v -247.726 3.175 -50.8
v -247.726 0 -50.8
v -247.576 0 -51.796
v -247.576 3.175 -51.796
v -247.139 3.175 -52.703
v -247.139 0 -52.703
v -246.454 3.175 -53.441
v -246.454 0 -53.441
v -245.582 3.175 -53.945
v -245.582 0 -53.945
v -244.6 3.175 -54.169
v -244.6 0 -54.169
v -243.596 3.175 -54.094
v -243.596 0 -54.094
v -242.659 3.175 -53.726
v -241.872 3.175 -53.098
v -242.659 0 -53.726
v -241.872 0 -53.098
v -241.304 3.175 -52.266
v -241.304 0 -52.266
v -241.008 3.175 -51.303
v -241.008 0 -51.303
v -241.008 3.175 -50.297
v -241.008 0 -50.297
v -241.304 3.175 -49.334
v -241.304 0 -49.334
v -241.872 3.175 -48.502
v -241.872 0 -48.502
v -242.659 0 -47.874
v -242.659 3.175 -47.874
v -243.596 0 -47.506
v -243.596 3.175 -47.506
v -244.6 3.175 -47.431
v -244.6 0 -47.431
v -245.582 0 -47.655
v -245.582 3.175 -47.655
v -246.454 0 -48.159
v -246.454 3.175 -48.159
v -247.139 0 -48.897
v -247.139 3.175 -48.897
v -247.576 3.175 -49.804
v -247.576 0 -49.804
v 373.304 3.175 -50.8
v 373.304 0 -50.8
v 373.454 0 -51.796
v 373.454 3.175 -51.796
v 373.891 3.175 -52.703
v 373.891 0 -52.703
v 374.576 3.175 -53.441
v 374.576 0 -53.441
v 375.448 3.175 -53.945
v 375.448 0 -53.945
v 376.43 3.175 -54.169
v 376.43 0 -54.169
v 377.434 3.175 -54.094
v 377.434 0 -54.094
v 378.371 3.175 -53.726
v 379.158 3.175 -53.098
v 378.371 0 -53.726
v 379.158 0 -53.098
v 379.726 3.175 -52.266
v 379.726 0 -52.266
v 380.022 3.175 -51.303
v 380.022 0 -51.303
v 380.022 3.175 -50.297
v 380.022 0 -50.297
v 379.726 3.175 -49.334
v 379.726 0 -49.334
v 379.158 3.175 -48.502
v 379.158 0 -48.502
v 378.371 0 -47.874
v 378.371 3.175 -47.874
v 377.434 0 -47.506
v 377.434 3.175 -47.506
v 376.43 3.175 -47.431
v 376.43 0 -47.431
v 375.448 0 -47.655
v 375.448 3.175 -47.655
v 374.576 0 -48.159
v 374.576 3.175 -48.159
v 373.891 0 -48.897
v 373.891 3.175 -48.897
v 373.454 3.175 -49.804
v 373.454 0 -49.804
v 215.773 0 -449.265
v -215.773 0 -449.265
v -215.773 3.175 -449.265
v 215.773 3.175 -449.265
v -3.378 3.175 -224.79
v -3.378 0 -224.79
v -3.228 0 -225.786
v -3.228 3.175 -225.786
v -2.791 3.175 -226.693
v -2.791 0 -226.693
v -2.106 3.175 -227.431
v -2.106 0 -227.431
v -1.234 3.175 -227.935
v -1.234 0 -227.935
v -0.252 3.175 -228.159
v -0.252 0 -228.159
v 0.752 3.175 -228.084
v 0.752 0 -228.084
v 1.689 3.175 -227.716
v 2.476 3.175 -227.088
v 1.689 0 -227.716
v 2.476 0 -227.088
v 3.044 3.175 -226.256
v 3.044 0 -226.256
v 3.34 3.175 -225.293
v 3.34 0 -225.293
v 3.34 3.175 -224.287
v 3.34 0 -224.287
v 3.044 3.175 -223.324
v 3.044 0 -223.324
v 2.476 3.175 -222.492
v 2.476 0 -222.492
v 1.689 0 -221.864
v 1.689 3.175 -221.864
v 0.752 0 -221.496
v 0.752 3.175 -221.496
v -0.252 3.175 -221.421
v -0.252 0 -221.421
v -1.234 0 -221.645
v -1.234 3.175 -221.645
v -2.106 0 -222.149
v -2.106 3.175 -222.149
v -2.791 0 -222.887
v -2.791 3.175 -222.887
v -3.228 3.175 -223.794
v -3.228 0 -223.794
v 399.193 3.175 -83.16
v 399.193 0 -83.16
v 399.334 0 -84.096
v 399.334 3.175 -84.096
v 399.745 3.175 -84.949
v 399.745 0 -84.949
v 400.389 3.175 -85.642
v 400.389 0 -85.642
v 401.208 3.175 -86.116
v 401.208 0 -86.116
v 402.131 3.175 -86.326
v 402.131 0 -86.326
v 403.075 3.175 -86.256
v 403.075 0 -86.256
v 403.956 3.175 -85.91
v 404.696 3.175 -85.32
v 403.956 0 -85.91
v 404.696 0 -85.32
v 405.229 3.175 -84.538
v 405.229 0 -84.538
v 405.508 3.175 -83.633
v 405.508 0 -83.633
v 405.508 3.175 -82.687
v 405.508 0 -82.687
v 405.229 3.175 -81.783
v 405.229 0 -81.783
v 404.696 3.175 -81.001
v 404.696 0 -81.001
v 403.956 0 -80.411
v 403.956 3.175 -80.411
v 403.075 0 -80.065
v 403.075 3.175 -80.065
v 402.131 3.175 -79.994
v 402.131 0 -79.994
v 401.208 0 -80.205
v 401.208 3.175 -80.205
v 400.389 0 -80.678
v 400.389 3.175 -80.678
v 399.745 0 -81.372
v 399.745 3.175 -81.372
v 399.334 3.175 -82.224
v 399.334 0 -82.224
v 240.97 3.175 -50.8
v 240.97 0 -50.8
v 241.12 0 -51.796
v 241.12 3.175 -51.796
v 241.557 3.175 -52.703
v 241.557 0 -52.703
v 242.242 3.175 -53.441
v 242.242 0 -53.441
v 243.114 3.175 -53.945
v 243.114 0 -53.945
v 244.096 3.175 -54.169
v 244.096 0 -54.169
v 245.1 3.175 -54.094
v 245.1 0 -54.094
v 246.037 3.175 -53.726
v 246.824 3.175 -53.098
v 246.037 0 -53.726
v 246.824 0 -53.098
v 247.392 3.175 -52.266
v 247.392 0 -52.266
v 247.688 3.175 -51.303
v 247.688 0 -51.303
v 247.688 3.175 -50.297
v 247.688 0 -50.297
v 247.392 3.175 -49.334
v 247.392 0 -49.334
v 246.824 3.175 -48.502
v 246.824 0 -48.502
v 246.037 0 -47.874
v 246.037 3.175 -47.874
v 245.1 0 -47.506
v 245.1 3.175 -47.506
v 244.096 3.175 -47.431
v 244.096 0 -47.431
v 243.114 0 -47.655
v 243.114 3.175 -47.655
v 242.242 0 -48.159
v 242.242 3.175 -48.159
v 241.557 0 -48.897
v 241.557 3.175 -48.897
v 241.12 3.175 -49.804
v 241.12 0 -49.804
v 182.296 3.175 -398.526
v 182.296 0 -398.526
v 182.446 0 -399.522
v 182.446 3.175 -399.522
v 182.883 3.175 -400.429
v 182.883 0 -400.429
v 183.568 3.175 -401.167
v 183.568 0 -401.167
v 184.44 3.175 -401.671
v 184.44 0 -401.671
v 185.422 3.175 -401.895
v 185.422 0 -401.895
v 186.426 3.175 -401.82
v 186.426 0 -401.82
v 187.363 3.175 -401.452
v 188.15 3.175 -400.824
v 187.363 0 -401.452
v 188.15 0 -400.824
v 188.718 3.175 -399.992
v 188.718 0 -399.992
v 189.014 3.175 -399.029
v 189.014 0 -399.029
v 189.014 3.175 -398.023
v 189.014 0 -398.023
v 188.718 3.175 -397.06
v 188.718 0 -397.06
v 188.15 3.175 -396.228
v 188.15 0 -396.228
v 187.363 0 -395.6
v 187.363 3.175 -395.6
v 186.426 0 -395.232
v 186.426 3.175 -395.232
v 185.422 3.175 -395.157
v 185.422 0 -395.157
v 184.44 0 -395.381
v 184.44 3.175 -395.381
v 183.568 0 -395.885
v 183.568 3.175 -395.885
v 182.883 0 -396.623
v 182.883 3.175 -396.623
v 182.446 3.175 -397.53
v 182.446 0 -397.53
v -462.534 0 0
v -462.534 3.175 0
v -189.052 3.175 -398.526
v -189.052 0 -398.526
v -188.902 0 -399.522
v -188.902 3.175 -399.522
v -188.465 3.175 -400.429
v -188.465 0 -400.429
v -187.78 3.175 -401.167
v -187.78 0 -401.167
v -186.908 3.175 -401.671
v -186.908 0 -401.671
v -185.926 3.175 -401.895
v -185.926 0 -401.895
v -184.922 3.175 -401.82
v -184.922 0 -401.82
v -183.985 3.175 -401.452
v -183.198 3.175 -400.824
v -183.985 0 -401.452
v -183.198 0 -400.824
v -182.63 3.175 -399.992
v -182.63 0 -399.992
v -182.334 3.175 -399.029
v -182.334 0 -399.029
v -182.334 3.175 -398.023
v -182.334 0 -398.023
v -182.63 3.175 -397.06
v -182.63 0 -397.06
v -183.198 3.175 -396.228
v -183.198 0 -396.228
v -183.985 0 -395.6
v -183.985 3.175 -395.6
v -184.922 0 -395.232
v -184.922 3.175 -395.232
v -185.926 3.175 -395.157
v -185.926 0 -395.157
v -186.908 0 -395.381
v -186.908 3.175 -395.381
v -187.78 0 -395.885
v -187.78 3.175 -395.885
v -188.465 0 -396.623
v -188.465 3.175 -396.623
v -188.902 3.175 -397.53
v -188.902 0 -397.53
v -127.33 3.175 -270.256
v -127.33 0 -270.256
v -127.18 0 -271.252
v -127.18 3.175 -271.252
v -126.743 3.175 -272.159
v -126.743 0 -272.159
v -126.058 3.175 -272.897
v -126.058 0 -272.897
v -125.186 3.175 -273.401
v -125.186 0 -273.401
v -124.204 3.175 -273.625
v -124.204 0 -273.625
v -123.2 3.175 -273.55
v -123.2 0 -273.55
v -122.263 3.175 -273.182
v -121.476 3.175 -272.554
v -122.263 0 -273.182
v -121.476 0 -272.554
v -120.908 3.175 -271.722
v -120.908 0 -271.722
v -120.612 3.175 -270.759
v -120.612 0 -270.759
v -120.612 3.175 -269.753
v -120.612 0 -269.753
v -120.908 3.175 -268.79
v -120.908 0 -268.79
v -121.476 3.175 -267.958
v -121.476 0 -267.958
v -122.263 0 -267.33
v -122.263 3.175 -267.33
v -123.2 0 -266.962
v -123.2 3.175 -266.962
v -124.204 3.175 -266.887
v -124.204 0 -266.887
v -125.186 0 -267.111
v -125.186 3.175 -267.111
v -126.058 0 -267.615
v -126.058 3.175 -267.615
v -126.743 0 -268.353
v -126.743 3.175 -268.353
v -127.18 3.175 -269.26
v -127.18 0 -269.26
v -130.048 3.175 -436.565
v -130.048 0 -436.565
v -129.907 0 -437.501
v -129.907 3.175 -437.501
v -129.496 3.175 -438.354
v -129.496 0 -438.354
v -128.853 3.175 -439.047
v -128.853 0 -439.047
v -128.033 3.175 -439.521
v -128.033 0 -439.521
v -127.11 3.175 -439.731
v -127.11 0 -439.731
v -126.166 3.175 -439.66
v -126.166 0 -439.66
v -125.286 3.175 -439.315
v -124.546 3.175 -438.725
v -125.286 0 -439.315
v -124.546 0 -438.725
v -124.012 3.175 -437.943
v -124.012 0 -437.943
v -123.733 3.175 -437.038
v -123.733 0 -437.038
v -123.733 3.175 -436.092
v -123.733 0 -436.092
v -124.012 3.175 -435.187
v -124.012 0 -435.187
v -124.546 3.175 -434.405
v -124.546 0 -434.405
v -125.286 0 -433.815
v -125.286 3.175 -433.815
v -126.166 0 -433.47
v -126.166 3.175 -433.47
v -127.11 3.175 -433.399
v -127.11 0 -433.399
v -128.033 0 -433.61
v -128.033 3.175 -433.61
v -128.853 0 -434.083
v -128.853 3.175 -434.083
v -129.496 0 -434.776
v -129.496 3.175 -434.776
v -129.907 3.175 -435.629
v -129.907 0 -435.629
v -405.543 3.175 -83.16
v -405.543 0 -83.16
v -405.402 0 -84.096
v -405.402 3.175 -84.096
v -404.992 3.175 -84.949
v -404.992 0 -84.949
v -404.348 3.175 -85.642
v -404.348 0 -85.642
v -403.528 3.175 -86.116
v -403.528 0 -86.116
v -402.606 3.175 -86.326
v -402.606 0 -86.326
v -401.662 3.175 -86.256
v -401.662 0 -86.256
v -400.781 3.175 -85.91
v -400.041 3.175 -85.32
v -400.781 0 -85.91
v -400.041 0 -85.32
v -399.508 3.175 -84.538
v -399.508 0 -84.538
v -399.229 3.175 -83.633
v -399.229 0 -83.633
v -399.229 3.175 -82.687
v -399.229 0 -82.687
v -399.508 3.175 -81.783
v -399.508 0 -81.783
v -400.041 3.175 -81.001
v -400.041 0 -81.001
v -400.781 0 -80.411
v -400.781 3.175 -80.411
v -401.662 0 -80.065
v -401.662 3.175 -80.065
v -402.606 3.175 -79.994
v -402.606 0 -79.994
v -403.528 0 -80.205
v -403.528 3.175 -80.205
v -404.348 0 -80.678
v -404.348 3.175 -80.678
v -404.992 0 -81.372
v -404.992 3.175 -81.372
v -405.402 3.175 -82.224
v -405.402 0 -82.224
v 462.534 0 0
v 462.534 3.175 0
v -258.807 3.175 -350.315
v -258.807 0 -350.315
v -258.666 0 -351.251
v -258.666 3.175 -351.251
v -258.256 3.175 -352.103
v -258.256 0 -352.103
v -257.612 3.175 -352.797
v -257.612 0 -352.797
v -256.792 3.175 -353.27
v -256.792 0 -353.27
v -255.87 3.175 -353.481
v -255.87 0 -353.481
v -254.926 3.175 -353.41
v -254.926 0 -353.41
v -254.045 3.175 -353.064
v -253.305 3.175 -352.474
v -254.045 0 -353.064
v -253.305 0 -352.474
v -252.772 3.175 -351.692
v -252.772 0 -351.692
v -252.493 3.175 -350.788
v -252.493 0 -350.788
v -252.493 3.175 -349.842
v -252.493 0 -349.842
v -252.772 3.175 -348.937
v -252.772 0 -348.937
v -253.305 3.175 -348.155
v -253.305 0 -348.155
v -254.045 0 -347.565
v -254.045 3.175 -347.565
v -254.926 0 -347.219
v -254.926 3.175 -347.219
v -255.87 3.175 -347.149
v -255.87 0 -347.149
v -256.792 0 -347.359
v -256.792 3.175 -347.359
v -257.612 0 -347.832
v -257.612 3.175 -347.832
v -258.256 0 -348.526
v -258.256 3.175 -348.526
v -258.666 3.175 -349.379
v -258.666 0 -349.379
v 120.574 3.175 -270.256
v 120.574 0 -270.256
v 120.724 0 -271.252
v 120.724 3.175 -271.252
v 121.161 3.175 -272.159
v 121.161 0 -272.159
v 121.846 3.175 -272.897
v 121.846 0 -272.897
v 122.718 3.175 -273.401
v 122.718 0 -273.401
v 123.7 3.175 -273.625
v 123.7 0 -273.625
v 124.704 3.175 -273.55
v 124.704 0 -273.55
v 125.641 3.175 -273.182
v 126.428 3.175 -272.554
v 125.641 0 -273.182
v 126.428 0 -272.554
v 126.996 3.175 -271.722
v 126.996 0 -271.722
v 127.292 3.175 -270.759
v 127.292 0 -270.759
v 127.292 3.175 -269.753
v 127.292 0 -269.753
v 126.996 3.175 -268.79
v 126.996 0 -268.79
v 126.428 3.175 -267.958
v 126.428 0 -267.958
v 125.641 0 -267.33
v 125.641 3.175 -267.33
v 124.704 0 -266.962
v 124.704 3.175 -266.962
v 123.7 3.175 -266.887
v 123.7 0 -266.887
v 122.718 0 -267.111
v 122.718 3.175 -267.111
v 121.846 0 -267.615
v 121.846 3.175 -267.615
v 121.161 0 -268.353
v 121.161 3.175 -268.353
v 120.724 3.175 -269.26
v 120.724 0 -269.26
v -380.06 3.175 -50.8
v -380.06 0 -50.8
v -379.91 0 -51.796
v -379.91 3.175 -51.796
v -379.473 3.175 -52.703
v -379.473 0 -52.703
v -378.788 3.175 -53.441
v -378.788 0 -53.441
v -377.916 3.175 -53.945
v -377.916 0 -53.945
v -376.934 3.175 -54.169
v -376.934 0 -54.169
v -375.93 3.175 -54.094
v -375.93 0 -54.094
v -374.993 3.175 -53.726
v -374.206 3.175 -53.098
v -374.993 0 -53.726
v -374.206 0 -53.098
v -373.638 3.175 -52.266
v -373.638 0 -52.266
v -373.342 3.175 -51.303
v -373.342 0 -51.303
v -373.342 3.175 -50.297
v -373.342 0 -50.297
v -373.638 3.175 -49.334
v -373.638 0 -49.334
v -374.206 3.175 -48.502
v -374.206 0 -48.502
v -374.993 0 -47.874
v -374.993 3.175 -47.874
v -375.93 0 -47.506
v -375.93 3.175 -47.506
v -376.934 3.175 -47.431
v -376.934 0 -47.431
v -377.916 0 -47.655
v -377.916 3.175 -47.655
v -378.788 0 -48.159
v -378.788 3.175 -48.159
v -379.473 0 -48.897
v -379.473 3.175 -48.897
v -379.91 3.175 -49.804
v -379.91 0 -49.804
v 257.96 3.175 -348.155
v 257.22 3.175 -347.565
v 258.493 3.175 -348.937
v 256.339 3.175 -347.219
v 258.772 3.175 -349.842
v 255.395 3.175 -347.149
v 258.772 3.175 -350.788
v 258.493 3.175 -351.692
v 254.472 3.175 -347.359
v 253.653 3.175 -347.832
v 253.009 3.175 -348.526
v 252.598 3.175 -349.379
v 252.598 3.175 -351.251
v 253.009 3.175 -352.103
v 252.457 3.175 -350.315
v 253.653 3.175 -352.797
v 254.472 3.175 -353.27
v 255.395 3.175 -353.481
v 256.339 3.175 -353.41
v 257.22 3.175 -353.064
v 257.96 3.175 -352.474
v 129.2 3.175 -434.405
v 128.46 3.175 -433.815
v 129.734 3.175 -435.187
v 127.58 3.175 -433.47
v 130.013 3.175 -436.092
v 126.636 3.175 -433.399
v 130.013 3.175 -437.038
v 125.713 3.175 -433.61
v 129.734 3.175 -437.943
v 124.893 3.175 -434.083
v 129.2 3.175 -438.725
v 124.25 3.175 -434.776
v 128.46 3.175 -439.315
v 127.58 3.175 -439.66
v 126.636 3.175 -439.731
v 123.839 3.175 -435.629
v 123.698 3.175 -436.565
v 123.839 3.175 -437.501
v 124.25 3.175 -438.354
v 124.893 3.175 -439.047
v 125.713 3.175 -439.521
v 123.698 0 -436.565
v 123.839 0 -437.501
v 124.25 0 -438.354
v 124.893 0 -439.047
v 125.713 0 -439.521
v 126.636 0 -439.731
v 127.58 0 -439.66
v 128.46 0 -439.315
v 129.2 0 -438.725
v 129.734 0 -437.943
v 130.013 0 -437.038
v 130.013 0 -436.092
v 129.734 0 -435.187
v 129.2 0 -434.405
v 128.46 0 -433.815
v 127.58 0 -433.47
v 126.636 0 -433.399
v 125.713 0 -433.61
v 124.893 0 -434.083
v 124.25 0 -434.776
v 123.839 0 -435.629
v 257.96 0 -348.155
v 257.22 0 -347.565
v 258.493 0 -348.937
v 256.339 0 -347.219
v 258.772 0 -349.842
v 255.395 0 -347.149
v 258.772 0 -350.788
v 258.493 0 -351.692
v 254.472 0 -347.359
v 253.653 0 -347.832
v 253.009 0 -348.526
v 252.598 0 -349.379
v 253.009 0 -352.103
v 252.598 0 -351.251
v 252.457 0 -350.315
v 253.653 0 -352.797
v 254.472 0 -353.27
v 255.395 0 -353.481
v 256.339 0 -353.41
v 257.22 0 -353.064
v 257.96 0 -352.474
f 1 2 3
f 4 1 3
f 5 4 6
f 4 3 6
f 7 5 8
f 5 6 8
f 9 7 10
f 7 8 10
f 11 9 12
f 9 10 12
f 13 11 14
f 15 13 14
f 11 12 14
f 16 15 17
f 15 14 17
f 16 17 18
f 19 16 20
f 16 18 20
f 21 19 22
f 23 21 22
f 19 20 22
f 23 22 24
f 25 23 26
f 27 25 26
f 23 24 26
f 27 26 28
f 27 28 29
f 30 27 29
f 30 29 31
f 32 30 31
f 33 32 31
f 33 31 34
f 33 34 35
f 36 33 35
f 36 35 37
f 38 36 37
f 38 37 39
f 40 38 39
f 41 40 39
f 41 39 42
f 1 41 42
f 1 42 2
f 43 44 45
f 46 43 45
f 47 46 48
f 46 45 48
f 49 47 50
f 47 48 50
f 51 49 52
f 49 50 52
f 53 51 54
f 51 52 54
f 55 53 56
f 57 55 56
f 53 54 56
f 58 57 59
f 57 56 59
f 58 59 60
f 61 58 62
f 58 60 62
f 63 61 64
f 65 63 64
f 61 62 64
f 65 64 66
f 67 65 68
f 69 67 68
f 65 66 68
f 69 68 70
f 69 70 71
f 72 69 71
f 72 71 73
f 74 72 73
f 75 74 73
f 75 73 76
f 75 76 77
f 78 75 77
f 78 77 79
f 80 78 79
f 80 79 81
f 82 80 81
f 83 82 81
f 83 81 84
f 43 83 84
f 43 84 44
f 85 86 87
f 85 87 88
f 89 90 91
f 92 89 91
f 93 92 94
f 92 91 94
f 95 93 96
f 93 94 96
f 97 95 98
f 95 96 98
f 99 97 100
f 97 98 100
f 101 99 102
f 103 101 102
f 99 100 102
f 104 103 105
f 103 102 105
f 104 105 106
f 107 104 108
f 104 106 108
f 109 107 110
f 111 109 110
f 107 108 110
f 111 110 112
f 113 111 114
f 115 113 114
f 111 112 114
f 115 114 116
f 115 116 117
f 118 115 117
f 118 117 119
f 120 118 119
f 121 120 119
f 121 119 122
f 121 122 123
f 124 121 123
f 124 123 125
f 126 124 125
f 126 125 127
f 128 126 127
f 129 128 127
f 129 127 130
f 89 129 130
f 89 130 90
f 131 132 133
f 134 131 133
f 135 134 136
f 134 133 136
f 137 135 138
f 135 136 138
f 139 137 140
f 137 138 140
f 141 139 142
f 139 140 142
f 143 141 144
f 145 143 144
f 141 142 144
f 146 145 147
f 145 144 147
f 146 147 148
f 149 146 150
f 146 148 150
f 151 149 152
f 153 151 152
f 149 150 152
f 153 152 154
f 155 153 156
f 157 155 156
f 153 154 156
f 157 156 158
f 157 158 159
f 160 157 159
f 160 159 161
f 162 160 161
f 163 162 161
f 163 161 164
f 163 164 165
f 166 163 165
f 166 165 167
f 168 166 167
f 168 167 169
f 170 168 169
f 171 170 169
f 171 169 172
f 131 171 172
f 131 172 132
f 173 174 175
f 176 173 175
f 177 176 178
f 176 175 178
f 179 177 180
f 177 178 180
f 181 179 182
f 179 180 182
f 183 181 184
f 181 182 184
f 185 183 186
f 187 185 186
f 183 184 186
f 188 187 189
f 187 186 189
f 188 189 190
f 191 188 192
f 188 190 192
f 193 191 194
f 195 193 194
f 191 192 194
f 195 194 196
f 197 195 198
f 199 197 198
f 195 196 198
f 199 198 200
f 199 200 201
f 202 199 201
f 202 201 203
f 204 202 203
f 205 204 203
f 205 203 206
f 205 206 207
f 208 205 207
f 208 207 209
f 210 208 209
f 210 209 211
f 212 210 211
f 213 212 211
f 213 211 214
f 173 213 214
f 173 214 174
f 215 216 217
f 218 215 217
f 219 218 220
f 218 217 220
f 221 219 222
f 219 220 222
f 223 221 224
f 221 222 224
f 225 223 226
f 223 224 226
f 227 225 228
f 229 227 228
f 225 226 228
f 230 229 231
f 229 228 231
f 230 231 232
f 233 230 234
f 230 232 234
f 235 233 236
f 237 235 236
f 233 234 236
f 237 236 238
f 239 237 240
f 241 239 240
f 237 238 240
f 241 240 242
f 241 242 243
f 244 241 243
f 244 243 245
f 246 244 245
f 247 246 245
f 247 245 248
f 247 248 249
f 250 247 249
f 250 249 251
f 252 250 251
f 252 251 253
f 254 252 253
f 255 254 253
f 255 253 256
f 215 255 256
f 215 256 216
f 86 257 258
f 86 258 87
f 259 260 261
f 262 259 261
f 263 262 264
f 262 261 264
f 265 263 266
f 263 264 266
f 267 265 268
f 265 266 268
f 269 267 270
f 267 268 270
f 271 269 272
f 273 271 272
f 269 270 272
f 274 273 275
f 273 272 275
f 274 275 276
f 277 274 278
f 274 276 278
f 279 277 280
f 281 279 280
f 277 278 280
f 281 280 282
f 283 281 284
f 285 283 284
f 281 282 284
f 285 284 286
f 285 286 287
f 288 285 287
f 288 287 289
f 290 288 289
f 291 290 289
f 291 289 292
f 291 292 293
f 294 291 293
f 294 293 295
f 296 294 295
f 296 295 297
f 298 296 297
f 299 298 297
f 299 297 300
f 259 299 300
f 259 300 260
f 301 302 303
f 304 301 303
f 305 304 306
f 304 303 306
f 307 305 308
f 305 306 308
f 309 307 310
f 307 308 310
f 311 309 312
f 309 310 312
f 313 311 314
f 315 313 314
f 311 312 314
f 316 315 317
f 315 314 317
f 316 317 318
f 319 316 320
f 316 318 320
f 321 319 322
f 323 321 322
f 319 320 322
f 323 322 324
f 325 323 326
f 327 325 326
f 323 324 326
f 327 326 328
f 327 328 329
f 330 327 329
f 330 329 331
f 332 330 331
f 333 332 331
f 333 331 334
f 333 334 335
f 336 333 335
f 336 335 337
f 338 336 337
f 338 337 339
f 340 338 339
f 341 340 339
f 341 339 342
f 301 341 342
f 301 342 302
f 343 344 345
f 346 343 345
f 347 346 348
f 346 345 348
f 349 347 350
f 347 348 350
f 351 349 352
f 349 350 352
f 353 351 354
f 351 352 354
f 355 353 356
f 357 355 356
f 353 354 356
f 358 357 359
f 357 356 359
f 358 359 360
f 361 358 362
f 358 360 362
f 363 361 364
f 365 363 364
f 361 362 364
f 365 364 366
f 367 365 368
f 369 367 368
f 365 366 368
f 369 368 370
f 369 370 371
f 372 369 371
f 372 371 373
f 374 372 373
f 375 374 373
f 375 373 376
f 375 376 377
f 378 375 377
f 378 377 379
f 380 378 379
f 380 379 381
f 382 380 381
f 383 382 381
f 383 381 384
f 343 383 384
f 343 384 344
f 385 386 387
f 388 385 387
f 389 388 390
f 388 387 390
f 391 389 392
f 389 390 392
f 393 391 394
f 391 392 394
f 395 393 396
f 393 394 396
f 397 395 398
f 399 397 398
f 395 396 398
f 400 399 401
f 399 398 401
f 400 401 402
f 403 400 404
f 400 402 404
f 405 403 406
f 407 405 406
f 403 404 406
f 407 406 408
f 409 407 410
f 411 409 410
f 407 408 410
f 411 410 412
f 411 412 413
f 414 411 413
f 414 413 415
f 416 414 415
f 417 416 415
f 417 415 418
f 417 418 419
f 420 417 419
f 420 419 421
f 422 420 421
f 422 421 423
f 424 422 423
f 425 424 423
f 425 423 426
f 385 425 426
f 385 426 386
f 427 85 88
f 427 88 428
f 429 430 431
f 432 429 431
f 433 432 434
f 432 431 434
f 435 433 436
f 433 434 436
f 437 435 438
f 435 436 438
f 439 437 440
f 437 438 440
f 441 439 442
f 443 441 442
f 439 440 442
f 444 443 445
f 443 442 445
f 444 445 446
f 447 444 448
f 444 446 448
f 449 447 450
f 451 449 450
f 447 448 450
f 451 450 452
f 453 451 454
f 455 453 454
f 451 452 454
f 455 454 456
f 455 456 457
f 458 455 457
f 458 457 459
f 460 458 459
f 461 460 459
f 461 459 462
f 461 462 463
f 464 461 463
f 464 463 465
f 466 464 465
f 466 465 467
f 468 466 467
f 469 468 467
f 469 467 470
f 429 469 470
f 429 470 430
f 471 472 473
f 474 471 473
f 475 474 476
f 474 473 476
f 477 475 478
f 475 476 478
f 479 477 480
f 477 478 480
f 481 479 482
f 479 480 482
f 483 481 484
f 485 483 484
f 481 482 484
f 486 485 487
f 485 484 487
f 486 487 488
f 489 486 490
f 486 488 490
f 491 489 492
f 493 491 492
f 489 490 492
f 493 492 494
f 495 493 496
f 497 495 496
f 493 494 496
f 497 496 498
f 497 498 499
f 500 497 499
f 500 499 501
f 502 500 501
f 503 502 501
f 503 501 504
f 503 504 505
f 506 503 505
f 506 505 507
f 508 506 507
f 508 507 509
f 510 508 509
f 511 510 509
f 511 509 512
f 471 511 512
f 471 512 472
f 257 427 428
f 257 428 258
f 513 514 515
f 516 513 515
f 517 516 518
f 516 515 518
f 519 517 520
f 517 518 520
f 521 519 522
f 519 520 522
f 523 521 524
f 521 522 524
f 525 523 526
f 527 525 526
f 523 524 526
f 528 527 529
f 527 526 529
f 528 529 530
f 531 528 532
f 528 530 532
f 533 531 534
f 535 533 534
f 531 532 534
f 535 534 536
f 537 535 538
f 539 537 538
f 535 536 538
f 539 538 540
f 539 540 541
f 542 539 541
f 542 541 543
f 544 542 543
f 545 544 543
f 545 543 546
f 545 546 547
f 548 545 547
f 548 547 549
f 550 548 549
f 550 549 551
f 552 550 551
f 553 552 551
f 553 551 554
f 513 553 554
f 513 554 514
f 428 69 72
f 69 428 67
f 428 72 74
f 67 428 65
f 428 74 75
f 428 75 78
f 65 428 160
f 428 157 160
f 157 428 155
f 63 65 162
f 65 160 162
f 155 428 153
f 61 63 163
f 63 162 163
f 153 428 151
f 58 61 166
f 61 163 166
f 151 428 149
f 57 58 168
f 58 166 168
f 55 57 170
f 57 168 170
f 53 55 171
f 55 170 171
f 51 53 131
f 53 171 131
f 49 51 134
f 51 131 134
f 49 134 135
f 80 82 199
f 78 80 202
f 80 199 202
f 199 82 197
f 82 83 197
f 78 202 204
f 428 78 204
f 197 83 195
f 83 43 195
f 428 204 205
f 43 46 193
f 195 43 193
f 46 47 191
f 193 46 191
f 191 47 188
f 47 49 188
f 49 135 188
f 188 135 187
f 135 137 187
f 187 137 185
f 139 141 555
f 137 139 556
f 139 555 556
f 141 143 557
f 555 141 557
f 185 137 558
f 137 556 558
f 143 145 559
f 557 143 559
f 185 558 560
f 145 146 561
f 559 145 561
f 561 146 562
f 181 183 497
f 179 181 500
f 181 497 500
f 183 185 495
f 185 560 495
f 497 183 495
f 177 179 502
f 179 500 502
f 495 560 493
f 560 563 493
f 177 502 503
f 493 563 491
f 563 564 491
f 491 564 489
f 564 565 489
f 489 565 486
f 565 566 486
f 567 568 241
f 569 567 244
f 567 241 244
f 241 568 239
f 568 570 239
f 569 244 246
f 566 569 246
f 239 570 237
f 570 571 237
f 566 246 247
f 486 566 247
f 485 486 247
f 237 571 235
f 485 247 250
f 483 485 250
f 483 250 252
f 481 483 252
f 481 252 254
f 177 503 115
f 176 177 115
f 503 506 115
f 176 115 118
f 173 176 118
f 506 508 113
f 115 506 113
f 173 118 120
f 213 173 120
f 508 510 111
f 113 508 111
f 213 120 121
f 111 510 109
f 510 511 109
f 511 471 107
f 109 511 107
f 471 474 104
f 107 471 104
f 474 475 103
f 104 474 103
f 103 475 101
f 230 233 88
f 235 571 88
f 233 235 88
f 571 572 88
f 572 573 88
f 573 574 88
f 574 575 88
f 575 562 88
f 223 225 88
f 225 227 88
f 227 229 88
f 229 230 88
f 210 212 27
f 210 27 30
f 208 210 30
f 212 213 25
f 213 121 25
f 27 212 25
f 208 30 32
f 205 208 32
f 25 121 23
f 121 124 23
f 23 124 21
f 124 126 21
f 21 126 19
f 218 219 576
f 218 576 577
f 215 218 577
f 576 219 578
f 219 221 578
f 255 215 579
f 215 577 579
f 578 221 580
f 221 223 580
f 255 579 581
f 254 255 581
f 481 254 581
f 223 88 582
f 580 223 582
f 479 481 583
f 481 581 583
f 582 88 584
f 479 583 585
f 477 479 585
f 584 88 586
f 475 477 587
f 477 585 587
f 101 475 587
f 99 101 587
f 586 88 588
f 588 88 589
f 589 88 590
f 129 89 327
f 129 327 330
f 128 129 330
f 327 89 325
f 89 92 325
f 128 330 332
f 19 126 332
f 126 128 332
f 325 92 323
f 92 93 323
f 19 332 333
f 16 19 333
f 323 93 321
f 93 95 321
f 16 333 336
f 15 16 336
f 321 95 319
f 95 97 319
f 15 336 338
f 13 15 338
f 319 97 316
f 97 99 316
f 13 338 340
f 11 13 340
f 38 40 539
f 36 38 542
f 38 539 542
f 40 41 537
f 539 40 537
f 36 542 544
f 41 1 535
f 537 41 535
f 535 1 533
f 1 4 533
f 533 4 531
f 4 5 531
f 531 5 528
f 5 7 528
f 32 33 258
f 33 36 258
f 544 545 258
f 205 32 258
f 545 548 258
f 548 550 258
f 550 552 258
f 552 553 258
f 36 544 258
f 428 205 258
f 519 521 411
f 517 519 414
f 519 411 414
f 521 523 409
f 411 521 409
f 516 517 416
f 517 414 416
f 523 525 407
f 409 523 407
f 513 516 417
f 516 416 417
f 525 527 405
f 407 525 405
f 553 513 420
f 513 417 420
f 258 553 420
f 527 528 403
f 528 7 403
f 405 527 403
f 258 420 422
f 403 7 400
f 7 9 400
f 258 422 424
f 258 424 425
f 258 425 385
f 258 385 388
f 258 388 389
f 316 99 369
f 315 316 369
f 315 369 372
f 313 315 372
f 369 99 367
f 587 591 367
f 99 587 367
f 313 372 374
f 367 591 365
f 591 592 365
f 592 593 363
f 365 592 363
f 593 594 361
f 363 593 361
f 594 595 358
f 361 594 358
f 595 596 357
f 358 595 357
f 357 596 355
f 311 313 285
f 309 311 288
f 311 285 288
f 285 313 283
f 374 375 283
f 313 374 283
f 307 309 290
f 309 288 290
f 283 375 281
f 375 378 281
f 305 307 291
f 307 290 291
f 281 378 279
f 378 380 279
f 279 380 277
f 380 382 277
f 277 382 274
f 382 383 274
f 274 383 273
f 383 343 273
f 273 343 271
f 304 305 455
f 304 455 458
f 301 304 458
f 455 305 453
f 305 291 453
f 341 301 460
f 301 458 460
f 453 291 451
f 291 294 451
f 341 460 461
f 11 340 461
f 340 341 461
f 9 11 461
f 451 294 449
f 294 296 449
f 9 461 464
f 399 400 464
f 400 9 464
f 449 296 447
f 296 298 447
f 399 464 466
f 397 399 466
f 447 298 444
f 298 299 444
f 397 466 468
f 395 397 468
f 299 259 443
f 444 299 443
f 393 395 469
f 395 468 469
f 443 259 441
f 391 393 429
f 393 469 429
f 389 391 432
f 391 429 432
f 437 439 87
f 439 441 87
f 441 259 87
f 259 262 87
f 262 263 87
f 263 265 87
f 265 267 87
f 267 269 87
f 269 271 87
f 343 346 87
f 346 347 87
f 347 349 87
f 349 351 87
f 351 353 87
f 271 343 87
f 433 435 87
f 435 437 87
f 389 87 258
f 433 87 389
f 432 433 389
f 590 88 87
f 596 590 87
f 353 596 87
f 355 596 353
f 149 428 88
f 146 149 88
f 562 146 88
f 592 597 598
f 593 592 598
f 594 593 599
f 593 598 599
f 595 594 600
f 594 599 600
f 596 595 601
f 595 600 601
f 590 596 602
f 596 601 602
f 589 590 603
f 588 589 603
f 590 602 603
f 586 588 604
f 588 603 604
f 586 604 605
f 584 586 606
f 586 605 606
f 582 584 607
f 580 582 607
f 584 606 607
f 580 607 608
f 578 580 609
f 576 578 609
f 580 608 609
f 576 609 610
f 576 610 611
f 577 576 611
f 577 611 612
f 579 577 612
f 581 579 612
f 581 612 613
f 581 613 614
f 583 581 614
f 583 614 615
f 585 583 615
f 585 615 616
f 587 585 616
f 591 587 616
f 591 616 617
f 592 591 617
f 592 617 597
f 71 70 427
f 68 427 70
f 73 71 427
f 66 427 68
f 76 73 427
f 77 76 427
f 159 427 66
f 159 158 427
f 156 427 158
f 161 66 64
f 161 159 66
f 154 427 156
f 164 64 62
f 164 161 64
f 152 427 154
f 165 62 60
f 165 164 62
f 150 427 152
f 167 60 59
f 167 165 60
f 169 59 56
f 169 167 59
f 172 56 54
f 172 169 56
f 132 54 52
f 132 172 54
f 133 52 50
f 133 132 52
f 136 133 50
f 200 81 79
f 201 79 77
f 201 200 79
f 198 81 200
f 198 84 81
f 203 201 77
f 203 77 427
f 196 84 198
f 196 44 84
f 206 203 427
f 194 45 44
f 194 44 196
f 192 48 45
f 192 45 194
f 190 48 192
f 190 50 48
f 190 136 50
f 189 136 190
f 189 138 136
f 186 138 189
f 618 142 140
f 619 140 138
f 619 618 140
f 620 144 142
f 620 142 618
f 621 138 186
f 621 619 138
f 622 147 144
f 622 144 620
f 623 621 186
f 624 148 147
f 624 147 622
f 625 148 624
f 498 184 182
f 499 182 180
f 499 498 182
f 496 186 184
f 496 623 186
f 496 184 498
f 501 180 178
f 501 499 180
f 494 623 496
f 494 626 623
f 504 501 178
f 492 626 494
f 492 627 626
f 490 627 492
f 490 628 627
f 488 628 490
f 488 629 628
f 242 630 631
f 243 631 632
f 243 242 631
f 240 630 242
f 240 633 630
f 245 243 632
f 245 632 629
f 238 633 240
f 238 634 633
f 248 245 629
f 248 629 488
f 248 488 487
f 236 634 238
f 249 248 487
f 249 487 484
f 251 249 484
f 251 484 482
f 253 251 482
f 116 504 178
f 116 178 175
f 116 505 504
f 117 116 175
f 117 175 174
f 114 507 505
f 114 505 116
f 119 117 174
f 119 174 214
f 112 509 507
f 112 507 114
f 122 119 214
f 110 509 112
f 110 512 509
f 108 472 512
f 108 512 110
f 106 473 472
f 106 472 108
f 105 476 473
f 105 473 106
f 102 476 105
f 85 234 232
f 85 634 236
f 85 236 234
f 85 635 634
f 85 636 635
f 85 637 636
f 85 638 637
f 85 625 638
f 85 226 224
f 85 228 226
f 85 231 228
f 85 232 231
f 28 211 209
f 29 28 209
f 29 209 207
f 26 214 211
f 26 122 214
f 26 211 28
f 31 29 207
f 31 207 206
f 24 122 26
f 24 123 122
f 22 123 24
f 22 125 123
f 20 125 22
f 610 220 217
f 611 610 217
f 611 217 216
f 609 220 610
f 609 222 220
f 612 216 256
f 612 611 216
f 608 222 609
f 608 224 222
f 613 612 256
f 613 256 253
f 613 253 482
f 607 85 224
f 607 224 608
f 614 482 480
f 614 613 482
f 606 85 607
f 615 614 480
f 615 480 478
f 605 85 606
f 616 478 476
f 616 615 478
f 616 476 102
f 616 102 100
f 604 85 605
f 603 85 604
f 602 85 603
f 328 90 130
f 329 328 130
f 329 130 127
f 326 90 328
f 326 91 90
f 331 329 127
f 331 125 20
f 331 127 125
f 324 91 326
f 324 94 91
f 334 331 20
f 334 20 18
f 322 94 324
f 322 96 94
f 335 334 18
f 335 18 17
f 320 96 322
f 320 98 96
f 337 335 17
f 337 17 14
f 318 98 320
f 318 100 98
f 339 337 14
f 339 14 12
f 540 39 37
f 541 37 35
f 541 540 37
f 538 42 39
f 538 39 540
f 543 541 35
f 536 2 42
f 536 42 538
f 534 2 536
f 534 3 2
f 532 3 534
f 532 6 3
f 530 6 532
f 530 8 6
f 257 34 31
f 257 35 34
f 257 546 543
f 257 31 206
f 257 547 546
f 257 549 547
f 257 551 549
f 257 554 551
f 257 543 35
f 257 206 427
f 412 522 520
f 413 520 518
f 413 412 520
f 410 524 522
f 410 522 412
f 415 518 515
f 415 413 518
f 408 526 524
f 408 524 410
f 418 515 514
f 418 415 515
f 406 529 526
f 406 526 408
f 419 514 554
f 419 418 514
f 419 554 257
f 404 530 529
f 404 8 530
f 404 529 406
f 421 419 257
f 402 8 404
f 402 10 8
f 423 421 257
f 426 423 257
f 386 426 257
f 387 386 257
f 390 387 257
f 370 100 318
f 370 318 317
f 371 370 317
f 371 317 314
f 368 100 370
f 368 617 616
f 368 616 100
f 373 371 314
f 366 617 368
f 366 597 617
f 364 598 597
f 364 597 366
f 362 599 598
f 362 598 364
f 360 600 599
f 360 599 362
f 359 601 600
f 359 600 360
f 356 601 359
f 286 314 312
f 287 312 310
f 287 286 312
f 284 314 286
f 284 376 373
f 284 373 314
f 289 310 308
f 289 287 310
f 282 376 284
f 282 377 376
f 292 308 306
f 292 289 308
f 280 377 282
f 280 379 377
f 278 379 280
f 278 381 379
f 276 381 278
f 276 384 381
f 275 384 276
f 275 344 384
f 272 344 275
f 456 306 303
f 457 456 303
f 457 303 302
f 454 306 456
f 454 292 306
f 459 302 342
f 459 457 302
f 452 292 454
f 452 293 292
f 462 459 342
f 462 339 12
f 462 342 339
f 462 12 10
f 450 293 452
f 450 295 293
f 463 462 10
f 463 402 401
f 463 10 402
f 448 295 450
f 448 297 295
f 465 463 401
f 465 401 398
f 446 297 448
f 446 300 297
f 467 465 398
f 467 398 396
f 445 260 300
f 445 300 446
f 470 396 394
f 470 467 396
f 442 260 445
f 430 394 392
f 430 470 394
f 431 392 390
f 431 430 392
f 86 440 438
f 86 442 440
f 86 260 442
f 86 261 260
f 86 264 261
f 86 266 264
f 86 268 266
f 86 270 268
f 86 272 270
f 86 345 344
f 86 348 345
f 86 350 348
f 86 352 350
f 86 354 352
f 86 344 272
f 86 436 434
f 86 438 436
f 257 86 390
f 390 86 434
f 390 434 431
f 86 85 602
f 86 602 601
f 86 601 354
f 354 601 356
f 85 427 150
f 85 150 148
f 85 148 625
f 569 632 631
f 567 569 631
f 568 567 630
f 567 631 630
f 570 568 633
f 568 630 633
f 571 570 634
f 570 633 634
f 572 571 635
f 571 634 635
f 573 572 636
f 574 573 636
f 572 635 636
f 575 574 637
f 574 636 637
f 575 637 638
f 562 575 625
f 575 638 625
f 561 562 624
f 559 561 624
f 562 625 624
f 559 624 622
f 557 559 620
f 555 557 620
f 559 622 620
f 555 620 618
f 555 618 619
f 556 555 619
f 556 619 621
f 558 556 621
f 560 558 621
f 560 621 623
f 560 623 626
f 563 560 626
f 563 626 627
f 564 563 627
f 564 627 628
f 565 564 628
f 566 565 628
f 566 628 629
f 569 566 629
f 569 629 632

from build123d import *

# Parameters (mm, degrees)
BOSS_EXTRUDE1_DEPTH         = 3.175
F_1_4_0_25_DIAMETER_HOLE1_D = 6.35
F_1_4_CLEARANCE_HOLE1_D     = 6.7564


with BuildPart() as part:
    # Sketch1 → Boss-Extrude1 (new body)
    with BuildSketch(Plane(origin=(0, 0, 0), x_dir=(1, 0, 0), z_dir=(0, 1, 0))):
        Polygon((-462.534, 0), (-215.773, 449.26502653), (215.773, 449.26502653), (462.534, 0), align=None)
    extrude(amount=BOSS_EXTRUDE1_DEPTH)

    # 1/4 (0.25) Diameter Hole1 (through all)
    with Locations(Plane(origin=(0, 3.175, 0), x_dir=(1, 0, 0), z_dir=(0, 1, 0))):
        with Locations((-402.368285269, 83.160171278), (-255.632309055, 350.314795577), (-126.873, 436.56502653), (402.368285269, 83.160171278), (255.632309055, 350.314795577), (126.873, 436.56502653)):
            Hole(F_1_4_0_25_DIAMETER_HOLE1_D / 2)

    # 1/4 Clearance Hole1 (through all)
    with Locations(Plane(origin=(0, 3.175, 0), x_dir=(1, 0, 0), z_dir=(0, 1, 0))):
        with Locations((-376.682, 50.8), (-244.348, 50.8), (-123.952, 270.256), (-185.674, 398.526), (0, 224.79), (376.682, 50.8), (244.348, 50.8), (185.674, 398.526), (123.952, 270.256)):
            Hole(F_1_4_CLEARANCE_HOLE1_D / 2)


solid = part.part
